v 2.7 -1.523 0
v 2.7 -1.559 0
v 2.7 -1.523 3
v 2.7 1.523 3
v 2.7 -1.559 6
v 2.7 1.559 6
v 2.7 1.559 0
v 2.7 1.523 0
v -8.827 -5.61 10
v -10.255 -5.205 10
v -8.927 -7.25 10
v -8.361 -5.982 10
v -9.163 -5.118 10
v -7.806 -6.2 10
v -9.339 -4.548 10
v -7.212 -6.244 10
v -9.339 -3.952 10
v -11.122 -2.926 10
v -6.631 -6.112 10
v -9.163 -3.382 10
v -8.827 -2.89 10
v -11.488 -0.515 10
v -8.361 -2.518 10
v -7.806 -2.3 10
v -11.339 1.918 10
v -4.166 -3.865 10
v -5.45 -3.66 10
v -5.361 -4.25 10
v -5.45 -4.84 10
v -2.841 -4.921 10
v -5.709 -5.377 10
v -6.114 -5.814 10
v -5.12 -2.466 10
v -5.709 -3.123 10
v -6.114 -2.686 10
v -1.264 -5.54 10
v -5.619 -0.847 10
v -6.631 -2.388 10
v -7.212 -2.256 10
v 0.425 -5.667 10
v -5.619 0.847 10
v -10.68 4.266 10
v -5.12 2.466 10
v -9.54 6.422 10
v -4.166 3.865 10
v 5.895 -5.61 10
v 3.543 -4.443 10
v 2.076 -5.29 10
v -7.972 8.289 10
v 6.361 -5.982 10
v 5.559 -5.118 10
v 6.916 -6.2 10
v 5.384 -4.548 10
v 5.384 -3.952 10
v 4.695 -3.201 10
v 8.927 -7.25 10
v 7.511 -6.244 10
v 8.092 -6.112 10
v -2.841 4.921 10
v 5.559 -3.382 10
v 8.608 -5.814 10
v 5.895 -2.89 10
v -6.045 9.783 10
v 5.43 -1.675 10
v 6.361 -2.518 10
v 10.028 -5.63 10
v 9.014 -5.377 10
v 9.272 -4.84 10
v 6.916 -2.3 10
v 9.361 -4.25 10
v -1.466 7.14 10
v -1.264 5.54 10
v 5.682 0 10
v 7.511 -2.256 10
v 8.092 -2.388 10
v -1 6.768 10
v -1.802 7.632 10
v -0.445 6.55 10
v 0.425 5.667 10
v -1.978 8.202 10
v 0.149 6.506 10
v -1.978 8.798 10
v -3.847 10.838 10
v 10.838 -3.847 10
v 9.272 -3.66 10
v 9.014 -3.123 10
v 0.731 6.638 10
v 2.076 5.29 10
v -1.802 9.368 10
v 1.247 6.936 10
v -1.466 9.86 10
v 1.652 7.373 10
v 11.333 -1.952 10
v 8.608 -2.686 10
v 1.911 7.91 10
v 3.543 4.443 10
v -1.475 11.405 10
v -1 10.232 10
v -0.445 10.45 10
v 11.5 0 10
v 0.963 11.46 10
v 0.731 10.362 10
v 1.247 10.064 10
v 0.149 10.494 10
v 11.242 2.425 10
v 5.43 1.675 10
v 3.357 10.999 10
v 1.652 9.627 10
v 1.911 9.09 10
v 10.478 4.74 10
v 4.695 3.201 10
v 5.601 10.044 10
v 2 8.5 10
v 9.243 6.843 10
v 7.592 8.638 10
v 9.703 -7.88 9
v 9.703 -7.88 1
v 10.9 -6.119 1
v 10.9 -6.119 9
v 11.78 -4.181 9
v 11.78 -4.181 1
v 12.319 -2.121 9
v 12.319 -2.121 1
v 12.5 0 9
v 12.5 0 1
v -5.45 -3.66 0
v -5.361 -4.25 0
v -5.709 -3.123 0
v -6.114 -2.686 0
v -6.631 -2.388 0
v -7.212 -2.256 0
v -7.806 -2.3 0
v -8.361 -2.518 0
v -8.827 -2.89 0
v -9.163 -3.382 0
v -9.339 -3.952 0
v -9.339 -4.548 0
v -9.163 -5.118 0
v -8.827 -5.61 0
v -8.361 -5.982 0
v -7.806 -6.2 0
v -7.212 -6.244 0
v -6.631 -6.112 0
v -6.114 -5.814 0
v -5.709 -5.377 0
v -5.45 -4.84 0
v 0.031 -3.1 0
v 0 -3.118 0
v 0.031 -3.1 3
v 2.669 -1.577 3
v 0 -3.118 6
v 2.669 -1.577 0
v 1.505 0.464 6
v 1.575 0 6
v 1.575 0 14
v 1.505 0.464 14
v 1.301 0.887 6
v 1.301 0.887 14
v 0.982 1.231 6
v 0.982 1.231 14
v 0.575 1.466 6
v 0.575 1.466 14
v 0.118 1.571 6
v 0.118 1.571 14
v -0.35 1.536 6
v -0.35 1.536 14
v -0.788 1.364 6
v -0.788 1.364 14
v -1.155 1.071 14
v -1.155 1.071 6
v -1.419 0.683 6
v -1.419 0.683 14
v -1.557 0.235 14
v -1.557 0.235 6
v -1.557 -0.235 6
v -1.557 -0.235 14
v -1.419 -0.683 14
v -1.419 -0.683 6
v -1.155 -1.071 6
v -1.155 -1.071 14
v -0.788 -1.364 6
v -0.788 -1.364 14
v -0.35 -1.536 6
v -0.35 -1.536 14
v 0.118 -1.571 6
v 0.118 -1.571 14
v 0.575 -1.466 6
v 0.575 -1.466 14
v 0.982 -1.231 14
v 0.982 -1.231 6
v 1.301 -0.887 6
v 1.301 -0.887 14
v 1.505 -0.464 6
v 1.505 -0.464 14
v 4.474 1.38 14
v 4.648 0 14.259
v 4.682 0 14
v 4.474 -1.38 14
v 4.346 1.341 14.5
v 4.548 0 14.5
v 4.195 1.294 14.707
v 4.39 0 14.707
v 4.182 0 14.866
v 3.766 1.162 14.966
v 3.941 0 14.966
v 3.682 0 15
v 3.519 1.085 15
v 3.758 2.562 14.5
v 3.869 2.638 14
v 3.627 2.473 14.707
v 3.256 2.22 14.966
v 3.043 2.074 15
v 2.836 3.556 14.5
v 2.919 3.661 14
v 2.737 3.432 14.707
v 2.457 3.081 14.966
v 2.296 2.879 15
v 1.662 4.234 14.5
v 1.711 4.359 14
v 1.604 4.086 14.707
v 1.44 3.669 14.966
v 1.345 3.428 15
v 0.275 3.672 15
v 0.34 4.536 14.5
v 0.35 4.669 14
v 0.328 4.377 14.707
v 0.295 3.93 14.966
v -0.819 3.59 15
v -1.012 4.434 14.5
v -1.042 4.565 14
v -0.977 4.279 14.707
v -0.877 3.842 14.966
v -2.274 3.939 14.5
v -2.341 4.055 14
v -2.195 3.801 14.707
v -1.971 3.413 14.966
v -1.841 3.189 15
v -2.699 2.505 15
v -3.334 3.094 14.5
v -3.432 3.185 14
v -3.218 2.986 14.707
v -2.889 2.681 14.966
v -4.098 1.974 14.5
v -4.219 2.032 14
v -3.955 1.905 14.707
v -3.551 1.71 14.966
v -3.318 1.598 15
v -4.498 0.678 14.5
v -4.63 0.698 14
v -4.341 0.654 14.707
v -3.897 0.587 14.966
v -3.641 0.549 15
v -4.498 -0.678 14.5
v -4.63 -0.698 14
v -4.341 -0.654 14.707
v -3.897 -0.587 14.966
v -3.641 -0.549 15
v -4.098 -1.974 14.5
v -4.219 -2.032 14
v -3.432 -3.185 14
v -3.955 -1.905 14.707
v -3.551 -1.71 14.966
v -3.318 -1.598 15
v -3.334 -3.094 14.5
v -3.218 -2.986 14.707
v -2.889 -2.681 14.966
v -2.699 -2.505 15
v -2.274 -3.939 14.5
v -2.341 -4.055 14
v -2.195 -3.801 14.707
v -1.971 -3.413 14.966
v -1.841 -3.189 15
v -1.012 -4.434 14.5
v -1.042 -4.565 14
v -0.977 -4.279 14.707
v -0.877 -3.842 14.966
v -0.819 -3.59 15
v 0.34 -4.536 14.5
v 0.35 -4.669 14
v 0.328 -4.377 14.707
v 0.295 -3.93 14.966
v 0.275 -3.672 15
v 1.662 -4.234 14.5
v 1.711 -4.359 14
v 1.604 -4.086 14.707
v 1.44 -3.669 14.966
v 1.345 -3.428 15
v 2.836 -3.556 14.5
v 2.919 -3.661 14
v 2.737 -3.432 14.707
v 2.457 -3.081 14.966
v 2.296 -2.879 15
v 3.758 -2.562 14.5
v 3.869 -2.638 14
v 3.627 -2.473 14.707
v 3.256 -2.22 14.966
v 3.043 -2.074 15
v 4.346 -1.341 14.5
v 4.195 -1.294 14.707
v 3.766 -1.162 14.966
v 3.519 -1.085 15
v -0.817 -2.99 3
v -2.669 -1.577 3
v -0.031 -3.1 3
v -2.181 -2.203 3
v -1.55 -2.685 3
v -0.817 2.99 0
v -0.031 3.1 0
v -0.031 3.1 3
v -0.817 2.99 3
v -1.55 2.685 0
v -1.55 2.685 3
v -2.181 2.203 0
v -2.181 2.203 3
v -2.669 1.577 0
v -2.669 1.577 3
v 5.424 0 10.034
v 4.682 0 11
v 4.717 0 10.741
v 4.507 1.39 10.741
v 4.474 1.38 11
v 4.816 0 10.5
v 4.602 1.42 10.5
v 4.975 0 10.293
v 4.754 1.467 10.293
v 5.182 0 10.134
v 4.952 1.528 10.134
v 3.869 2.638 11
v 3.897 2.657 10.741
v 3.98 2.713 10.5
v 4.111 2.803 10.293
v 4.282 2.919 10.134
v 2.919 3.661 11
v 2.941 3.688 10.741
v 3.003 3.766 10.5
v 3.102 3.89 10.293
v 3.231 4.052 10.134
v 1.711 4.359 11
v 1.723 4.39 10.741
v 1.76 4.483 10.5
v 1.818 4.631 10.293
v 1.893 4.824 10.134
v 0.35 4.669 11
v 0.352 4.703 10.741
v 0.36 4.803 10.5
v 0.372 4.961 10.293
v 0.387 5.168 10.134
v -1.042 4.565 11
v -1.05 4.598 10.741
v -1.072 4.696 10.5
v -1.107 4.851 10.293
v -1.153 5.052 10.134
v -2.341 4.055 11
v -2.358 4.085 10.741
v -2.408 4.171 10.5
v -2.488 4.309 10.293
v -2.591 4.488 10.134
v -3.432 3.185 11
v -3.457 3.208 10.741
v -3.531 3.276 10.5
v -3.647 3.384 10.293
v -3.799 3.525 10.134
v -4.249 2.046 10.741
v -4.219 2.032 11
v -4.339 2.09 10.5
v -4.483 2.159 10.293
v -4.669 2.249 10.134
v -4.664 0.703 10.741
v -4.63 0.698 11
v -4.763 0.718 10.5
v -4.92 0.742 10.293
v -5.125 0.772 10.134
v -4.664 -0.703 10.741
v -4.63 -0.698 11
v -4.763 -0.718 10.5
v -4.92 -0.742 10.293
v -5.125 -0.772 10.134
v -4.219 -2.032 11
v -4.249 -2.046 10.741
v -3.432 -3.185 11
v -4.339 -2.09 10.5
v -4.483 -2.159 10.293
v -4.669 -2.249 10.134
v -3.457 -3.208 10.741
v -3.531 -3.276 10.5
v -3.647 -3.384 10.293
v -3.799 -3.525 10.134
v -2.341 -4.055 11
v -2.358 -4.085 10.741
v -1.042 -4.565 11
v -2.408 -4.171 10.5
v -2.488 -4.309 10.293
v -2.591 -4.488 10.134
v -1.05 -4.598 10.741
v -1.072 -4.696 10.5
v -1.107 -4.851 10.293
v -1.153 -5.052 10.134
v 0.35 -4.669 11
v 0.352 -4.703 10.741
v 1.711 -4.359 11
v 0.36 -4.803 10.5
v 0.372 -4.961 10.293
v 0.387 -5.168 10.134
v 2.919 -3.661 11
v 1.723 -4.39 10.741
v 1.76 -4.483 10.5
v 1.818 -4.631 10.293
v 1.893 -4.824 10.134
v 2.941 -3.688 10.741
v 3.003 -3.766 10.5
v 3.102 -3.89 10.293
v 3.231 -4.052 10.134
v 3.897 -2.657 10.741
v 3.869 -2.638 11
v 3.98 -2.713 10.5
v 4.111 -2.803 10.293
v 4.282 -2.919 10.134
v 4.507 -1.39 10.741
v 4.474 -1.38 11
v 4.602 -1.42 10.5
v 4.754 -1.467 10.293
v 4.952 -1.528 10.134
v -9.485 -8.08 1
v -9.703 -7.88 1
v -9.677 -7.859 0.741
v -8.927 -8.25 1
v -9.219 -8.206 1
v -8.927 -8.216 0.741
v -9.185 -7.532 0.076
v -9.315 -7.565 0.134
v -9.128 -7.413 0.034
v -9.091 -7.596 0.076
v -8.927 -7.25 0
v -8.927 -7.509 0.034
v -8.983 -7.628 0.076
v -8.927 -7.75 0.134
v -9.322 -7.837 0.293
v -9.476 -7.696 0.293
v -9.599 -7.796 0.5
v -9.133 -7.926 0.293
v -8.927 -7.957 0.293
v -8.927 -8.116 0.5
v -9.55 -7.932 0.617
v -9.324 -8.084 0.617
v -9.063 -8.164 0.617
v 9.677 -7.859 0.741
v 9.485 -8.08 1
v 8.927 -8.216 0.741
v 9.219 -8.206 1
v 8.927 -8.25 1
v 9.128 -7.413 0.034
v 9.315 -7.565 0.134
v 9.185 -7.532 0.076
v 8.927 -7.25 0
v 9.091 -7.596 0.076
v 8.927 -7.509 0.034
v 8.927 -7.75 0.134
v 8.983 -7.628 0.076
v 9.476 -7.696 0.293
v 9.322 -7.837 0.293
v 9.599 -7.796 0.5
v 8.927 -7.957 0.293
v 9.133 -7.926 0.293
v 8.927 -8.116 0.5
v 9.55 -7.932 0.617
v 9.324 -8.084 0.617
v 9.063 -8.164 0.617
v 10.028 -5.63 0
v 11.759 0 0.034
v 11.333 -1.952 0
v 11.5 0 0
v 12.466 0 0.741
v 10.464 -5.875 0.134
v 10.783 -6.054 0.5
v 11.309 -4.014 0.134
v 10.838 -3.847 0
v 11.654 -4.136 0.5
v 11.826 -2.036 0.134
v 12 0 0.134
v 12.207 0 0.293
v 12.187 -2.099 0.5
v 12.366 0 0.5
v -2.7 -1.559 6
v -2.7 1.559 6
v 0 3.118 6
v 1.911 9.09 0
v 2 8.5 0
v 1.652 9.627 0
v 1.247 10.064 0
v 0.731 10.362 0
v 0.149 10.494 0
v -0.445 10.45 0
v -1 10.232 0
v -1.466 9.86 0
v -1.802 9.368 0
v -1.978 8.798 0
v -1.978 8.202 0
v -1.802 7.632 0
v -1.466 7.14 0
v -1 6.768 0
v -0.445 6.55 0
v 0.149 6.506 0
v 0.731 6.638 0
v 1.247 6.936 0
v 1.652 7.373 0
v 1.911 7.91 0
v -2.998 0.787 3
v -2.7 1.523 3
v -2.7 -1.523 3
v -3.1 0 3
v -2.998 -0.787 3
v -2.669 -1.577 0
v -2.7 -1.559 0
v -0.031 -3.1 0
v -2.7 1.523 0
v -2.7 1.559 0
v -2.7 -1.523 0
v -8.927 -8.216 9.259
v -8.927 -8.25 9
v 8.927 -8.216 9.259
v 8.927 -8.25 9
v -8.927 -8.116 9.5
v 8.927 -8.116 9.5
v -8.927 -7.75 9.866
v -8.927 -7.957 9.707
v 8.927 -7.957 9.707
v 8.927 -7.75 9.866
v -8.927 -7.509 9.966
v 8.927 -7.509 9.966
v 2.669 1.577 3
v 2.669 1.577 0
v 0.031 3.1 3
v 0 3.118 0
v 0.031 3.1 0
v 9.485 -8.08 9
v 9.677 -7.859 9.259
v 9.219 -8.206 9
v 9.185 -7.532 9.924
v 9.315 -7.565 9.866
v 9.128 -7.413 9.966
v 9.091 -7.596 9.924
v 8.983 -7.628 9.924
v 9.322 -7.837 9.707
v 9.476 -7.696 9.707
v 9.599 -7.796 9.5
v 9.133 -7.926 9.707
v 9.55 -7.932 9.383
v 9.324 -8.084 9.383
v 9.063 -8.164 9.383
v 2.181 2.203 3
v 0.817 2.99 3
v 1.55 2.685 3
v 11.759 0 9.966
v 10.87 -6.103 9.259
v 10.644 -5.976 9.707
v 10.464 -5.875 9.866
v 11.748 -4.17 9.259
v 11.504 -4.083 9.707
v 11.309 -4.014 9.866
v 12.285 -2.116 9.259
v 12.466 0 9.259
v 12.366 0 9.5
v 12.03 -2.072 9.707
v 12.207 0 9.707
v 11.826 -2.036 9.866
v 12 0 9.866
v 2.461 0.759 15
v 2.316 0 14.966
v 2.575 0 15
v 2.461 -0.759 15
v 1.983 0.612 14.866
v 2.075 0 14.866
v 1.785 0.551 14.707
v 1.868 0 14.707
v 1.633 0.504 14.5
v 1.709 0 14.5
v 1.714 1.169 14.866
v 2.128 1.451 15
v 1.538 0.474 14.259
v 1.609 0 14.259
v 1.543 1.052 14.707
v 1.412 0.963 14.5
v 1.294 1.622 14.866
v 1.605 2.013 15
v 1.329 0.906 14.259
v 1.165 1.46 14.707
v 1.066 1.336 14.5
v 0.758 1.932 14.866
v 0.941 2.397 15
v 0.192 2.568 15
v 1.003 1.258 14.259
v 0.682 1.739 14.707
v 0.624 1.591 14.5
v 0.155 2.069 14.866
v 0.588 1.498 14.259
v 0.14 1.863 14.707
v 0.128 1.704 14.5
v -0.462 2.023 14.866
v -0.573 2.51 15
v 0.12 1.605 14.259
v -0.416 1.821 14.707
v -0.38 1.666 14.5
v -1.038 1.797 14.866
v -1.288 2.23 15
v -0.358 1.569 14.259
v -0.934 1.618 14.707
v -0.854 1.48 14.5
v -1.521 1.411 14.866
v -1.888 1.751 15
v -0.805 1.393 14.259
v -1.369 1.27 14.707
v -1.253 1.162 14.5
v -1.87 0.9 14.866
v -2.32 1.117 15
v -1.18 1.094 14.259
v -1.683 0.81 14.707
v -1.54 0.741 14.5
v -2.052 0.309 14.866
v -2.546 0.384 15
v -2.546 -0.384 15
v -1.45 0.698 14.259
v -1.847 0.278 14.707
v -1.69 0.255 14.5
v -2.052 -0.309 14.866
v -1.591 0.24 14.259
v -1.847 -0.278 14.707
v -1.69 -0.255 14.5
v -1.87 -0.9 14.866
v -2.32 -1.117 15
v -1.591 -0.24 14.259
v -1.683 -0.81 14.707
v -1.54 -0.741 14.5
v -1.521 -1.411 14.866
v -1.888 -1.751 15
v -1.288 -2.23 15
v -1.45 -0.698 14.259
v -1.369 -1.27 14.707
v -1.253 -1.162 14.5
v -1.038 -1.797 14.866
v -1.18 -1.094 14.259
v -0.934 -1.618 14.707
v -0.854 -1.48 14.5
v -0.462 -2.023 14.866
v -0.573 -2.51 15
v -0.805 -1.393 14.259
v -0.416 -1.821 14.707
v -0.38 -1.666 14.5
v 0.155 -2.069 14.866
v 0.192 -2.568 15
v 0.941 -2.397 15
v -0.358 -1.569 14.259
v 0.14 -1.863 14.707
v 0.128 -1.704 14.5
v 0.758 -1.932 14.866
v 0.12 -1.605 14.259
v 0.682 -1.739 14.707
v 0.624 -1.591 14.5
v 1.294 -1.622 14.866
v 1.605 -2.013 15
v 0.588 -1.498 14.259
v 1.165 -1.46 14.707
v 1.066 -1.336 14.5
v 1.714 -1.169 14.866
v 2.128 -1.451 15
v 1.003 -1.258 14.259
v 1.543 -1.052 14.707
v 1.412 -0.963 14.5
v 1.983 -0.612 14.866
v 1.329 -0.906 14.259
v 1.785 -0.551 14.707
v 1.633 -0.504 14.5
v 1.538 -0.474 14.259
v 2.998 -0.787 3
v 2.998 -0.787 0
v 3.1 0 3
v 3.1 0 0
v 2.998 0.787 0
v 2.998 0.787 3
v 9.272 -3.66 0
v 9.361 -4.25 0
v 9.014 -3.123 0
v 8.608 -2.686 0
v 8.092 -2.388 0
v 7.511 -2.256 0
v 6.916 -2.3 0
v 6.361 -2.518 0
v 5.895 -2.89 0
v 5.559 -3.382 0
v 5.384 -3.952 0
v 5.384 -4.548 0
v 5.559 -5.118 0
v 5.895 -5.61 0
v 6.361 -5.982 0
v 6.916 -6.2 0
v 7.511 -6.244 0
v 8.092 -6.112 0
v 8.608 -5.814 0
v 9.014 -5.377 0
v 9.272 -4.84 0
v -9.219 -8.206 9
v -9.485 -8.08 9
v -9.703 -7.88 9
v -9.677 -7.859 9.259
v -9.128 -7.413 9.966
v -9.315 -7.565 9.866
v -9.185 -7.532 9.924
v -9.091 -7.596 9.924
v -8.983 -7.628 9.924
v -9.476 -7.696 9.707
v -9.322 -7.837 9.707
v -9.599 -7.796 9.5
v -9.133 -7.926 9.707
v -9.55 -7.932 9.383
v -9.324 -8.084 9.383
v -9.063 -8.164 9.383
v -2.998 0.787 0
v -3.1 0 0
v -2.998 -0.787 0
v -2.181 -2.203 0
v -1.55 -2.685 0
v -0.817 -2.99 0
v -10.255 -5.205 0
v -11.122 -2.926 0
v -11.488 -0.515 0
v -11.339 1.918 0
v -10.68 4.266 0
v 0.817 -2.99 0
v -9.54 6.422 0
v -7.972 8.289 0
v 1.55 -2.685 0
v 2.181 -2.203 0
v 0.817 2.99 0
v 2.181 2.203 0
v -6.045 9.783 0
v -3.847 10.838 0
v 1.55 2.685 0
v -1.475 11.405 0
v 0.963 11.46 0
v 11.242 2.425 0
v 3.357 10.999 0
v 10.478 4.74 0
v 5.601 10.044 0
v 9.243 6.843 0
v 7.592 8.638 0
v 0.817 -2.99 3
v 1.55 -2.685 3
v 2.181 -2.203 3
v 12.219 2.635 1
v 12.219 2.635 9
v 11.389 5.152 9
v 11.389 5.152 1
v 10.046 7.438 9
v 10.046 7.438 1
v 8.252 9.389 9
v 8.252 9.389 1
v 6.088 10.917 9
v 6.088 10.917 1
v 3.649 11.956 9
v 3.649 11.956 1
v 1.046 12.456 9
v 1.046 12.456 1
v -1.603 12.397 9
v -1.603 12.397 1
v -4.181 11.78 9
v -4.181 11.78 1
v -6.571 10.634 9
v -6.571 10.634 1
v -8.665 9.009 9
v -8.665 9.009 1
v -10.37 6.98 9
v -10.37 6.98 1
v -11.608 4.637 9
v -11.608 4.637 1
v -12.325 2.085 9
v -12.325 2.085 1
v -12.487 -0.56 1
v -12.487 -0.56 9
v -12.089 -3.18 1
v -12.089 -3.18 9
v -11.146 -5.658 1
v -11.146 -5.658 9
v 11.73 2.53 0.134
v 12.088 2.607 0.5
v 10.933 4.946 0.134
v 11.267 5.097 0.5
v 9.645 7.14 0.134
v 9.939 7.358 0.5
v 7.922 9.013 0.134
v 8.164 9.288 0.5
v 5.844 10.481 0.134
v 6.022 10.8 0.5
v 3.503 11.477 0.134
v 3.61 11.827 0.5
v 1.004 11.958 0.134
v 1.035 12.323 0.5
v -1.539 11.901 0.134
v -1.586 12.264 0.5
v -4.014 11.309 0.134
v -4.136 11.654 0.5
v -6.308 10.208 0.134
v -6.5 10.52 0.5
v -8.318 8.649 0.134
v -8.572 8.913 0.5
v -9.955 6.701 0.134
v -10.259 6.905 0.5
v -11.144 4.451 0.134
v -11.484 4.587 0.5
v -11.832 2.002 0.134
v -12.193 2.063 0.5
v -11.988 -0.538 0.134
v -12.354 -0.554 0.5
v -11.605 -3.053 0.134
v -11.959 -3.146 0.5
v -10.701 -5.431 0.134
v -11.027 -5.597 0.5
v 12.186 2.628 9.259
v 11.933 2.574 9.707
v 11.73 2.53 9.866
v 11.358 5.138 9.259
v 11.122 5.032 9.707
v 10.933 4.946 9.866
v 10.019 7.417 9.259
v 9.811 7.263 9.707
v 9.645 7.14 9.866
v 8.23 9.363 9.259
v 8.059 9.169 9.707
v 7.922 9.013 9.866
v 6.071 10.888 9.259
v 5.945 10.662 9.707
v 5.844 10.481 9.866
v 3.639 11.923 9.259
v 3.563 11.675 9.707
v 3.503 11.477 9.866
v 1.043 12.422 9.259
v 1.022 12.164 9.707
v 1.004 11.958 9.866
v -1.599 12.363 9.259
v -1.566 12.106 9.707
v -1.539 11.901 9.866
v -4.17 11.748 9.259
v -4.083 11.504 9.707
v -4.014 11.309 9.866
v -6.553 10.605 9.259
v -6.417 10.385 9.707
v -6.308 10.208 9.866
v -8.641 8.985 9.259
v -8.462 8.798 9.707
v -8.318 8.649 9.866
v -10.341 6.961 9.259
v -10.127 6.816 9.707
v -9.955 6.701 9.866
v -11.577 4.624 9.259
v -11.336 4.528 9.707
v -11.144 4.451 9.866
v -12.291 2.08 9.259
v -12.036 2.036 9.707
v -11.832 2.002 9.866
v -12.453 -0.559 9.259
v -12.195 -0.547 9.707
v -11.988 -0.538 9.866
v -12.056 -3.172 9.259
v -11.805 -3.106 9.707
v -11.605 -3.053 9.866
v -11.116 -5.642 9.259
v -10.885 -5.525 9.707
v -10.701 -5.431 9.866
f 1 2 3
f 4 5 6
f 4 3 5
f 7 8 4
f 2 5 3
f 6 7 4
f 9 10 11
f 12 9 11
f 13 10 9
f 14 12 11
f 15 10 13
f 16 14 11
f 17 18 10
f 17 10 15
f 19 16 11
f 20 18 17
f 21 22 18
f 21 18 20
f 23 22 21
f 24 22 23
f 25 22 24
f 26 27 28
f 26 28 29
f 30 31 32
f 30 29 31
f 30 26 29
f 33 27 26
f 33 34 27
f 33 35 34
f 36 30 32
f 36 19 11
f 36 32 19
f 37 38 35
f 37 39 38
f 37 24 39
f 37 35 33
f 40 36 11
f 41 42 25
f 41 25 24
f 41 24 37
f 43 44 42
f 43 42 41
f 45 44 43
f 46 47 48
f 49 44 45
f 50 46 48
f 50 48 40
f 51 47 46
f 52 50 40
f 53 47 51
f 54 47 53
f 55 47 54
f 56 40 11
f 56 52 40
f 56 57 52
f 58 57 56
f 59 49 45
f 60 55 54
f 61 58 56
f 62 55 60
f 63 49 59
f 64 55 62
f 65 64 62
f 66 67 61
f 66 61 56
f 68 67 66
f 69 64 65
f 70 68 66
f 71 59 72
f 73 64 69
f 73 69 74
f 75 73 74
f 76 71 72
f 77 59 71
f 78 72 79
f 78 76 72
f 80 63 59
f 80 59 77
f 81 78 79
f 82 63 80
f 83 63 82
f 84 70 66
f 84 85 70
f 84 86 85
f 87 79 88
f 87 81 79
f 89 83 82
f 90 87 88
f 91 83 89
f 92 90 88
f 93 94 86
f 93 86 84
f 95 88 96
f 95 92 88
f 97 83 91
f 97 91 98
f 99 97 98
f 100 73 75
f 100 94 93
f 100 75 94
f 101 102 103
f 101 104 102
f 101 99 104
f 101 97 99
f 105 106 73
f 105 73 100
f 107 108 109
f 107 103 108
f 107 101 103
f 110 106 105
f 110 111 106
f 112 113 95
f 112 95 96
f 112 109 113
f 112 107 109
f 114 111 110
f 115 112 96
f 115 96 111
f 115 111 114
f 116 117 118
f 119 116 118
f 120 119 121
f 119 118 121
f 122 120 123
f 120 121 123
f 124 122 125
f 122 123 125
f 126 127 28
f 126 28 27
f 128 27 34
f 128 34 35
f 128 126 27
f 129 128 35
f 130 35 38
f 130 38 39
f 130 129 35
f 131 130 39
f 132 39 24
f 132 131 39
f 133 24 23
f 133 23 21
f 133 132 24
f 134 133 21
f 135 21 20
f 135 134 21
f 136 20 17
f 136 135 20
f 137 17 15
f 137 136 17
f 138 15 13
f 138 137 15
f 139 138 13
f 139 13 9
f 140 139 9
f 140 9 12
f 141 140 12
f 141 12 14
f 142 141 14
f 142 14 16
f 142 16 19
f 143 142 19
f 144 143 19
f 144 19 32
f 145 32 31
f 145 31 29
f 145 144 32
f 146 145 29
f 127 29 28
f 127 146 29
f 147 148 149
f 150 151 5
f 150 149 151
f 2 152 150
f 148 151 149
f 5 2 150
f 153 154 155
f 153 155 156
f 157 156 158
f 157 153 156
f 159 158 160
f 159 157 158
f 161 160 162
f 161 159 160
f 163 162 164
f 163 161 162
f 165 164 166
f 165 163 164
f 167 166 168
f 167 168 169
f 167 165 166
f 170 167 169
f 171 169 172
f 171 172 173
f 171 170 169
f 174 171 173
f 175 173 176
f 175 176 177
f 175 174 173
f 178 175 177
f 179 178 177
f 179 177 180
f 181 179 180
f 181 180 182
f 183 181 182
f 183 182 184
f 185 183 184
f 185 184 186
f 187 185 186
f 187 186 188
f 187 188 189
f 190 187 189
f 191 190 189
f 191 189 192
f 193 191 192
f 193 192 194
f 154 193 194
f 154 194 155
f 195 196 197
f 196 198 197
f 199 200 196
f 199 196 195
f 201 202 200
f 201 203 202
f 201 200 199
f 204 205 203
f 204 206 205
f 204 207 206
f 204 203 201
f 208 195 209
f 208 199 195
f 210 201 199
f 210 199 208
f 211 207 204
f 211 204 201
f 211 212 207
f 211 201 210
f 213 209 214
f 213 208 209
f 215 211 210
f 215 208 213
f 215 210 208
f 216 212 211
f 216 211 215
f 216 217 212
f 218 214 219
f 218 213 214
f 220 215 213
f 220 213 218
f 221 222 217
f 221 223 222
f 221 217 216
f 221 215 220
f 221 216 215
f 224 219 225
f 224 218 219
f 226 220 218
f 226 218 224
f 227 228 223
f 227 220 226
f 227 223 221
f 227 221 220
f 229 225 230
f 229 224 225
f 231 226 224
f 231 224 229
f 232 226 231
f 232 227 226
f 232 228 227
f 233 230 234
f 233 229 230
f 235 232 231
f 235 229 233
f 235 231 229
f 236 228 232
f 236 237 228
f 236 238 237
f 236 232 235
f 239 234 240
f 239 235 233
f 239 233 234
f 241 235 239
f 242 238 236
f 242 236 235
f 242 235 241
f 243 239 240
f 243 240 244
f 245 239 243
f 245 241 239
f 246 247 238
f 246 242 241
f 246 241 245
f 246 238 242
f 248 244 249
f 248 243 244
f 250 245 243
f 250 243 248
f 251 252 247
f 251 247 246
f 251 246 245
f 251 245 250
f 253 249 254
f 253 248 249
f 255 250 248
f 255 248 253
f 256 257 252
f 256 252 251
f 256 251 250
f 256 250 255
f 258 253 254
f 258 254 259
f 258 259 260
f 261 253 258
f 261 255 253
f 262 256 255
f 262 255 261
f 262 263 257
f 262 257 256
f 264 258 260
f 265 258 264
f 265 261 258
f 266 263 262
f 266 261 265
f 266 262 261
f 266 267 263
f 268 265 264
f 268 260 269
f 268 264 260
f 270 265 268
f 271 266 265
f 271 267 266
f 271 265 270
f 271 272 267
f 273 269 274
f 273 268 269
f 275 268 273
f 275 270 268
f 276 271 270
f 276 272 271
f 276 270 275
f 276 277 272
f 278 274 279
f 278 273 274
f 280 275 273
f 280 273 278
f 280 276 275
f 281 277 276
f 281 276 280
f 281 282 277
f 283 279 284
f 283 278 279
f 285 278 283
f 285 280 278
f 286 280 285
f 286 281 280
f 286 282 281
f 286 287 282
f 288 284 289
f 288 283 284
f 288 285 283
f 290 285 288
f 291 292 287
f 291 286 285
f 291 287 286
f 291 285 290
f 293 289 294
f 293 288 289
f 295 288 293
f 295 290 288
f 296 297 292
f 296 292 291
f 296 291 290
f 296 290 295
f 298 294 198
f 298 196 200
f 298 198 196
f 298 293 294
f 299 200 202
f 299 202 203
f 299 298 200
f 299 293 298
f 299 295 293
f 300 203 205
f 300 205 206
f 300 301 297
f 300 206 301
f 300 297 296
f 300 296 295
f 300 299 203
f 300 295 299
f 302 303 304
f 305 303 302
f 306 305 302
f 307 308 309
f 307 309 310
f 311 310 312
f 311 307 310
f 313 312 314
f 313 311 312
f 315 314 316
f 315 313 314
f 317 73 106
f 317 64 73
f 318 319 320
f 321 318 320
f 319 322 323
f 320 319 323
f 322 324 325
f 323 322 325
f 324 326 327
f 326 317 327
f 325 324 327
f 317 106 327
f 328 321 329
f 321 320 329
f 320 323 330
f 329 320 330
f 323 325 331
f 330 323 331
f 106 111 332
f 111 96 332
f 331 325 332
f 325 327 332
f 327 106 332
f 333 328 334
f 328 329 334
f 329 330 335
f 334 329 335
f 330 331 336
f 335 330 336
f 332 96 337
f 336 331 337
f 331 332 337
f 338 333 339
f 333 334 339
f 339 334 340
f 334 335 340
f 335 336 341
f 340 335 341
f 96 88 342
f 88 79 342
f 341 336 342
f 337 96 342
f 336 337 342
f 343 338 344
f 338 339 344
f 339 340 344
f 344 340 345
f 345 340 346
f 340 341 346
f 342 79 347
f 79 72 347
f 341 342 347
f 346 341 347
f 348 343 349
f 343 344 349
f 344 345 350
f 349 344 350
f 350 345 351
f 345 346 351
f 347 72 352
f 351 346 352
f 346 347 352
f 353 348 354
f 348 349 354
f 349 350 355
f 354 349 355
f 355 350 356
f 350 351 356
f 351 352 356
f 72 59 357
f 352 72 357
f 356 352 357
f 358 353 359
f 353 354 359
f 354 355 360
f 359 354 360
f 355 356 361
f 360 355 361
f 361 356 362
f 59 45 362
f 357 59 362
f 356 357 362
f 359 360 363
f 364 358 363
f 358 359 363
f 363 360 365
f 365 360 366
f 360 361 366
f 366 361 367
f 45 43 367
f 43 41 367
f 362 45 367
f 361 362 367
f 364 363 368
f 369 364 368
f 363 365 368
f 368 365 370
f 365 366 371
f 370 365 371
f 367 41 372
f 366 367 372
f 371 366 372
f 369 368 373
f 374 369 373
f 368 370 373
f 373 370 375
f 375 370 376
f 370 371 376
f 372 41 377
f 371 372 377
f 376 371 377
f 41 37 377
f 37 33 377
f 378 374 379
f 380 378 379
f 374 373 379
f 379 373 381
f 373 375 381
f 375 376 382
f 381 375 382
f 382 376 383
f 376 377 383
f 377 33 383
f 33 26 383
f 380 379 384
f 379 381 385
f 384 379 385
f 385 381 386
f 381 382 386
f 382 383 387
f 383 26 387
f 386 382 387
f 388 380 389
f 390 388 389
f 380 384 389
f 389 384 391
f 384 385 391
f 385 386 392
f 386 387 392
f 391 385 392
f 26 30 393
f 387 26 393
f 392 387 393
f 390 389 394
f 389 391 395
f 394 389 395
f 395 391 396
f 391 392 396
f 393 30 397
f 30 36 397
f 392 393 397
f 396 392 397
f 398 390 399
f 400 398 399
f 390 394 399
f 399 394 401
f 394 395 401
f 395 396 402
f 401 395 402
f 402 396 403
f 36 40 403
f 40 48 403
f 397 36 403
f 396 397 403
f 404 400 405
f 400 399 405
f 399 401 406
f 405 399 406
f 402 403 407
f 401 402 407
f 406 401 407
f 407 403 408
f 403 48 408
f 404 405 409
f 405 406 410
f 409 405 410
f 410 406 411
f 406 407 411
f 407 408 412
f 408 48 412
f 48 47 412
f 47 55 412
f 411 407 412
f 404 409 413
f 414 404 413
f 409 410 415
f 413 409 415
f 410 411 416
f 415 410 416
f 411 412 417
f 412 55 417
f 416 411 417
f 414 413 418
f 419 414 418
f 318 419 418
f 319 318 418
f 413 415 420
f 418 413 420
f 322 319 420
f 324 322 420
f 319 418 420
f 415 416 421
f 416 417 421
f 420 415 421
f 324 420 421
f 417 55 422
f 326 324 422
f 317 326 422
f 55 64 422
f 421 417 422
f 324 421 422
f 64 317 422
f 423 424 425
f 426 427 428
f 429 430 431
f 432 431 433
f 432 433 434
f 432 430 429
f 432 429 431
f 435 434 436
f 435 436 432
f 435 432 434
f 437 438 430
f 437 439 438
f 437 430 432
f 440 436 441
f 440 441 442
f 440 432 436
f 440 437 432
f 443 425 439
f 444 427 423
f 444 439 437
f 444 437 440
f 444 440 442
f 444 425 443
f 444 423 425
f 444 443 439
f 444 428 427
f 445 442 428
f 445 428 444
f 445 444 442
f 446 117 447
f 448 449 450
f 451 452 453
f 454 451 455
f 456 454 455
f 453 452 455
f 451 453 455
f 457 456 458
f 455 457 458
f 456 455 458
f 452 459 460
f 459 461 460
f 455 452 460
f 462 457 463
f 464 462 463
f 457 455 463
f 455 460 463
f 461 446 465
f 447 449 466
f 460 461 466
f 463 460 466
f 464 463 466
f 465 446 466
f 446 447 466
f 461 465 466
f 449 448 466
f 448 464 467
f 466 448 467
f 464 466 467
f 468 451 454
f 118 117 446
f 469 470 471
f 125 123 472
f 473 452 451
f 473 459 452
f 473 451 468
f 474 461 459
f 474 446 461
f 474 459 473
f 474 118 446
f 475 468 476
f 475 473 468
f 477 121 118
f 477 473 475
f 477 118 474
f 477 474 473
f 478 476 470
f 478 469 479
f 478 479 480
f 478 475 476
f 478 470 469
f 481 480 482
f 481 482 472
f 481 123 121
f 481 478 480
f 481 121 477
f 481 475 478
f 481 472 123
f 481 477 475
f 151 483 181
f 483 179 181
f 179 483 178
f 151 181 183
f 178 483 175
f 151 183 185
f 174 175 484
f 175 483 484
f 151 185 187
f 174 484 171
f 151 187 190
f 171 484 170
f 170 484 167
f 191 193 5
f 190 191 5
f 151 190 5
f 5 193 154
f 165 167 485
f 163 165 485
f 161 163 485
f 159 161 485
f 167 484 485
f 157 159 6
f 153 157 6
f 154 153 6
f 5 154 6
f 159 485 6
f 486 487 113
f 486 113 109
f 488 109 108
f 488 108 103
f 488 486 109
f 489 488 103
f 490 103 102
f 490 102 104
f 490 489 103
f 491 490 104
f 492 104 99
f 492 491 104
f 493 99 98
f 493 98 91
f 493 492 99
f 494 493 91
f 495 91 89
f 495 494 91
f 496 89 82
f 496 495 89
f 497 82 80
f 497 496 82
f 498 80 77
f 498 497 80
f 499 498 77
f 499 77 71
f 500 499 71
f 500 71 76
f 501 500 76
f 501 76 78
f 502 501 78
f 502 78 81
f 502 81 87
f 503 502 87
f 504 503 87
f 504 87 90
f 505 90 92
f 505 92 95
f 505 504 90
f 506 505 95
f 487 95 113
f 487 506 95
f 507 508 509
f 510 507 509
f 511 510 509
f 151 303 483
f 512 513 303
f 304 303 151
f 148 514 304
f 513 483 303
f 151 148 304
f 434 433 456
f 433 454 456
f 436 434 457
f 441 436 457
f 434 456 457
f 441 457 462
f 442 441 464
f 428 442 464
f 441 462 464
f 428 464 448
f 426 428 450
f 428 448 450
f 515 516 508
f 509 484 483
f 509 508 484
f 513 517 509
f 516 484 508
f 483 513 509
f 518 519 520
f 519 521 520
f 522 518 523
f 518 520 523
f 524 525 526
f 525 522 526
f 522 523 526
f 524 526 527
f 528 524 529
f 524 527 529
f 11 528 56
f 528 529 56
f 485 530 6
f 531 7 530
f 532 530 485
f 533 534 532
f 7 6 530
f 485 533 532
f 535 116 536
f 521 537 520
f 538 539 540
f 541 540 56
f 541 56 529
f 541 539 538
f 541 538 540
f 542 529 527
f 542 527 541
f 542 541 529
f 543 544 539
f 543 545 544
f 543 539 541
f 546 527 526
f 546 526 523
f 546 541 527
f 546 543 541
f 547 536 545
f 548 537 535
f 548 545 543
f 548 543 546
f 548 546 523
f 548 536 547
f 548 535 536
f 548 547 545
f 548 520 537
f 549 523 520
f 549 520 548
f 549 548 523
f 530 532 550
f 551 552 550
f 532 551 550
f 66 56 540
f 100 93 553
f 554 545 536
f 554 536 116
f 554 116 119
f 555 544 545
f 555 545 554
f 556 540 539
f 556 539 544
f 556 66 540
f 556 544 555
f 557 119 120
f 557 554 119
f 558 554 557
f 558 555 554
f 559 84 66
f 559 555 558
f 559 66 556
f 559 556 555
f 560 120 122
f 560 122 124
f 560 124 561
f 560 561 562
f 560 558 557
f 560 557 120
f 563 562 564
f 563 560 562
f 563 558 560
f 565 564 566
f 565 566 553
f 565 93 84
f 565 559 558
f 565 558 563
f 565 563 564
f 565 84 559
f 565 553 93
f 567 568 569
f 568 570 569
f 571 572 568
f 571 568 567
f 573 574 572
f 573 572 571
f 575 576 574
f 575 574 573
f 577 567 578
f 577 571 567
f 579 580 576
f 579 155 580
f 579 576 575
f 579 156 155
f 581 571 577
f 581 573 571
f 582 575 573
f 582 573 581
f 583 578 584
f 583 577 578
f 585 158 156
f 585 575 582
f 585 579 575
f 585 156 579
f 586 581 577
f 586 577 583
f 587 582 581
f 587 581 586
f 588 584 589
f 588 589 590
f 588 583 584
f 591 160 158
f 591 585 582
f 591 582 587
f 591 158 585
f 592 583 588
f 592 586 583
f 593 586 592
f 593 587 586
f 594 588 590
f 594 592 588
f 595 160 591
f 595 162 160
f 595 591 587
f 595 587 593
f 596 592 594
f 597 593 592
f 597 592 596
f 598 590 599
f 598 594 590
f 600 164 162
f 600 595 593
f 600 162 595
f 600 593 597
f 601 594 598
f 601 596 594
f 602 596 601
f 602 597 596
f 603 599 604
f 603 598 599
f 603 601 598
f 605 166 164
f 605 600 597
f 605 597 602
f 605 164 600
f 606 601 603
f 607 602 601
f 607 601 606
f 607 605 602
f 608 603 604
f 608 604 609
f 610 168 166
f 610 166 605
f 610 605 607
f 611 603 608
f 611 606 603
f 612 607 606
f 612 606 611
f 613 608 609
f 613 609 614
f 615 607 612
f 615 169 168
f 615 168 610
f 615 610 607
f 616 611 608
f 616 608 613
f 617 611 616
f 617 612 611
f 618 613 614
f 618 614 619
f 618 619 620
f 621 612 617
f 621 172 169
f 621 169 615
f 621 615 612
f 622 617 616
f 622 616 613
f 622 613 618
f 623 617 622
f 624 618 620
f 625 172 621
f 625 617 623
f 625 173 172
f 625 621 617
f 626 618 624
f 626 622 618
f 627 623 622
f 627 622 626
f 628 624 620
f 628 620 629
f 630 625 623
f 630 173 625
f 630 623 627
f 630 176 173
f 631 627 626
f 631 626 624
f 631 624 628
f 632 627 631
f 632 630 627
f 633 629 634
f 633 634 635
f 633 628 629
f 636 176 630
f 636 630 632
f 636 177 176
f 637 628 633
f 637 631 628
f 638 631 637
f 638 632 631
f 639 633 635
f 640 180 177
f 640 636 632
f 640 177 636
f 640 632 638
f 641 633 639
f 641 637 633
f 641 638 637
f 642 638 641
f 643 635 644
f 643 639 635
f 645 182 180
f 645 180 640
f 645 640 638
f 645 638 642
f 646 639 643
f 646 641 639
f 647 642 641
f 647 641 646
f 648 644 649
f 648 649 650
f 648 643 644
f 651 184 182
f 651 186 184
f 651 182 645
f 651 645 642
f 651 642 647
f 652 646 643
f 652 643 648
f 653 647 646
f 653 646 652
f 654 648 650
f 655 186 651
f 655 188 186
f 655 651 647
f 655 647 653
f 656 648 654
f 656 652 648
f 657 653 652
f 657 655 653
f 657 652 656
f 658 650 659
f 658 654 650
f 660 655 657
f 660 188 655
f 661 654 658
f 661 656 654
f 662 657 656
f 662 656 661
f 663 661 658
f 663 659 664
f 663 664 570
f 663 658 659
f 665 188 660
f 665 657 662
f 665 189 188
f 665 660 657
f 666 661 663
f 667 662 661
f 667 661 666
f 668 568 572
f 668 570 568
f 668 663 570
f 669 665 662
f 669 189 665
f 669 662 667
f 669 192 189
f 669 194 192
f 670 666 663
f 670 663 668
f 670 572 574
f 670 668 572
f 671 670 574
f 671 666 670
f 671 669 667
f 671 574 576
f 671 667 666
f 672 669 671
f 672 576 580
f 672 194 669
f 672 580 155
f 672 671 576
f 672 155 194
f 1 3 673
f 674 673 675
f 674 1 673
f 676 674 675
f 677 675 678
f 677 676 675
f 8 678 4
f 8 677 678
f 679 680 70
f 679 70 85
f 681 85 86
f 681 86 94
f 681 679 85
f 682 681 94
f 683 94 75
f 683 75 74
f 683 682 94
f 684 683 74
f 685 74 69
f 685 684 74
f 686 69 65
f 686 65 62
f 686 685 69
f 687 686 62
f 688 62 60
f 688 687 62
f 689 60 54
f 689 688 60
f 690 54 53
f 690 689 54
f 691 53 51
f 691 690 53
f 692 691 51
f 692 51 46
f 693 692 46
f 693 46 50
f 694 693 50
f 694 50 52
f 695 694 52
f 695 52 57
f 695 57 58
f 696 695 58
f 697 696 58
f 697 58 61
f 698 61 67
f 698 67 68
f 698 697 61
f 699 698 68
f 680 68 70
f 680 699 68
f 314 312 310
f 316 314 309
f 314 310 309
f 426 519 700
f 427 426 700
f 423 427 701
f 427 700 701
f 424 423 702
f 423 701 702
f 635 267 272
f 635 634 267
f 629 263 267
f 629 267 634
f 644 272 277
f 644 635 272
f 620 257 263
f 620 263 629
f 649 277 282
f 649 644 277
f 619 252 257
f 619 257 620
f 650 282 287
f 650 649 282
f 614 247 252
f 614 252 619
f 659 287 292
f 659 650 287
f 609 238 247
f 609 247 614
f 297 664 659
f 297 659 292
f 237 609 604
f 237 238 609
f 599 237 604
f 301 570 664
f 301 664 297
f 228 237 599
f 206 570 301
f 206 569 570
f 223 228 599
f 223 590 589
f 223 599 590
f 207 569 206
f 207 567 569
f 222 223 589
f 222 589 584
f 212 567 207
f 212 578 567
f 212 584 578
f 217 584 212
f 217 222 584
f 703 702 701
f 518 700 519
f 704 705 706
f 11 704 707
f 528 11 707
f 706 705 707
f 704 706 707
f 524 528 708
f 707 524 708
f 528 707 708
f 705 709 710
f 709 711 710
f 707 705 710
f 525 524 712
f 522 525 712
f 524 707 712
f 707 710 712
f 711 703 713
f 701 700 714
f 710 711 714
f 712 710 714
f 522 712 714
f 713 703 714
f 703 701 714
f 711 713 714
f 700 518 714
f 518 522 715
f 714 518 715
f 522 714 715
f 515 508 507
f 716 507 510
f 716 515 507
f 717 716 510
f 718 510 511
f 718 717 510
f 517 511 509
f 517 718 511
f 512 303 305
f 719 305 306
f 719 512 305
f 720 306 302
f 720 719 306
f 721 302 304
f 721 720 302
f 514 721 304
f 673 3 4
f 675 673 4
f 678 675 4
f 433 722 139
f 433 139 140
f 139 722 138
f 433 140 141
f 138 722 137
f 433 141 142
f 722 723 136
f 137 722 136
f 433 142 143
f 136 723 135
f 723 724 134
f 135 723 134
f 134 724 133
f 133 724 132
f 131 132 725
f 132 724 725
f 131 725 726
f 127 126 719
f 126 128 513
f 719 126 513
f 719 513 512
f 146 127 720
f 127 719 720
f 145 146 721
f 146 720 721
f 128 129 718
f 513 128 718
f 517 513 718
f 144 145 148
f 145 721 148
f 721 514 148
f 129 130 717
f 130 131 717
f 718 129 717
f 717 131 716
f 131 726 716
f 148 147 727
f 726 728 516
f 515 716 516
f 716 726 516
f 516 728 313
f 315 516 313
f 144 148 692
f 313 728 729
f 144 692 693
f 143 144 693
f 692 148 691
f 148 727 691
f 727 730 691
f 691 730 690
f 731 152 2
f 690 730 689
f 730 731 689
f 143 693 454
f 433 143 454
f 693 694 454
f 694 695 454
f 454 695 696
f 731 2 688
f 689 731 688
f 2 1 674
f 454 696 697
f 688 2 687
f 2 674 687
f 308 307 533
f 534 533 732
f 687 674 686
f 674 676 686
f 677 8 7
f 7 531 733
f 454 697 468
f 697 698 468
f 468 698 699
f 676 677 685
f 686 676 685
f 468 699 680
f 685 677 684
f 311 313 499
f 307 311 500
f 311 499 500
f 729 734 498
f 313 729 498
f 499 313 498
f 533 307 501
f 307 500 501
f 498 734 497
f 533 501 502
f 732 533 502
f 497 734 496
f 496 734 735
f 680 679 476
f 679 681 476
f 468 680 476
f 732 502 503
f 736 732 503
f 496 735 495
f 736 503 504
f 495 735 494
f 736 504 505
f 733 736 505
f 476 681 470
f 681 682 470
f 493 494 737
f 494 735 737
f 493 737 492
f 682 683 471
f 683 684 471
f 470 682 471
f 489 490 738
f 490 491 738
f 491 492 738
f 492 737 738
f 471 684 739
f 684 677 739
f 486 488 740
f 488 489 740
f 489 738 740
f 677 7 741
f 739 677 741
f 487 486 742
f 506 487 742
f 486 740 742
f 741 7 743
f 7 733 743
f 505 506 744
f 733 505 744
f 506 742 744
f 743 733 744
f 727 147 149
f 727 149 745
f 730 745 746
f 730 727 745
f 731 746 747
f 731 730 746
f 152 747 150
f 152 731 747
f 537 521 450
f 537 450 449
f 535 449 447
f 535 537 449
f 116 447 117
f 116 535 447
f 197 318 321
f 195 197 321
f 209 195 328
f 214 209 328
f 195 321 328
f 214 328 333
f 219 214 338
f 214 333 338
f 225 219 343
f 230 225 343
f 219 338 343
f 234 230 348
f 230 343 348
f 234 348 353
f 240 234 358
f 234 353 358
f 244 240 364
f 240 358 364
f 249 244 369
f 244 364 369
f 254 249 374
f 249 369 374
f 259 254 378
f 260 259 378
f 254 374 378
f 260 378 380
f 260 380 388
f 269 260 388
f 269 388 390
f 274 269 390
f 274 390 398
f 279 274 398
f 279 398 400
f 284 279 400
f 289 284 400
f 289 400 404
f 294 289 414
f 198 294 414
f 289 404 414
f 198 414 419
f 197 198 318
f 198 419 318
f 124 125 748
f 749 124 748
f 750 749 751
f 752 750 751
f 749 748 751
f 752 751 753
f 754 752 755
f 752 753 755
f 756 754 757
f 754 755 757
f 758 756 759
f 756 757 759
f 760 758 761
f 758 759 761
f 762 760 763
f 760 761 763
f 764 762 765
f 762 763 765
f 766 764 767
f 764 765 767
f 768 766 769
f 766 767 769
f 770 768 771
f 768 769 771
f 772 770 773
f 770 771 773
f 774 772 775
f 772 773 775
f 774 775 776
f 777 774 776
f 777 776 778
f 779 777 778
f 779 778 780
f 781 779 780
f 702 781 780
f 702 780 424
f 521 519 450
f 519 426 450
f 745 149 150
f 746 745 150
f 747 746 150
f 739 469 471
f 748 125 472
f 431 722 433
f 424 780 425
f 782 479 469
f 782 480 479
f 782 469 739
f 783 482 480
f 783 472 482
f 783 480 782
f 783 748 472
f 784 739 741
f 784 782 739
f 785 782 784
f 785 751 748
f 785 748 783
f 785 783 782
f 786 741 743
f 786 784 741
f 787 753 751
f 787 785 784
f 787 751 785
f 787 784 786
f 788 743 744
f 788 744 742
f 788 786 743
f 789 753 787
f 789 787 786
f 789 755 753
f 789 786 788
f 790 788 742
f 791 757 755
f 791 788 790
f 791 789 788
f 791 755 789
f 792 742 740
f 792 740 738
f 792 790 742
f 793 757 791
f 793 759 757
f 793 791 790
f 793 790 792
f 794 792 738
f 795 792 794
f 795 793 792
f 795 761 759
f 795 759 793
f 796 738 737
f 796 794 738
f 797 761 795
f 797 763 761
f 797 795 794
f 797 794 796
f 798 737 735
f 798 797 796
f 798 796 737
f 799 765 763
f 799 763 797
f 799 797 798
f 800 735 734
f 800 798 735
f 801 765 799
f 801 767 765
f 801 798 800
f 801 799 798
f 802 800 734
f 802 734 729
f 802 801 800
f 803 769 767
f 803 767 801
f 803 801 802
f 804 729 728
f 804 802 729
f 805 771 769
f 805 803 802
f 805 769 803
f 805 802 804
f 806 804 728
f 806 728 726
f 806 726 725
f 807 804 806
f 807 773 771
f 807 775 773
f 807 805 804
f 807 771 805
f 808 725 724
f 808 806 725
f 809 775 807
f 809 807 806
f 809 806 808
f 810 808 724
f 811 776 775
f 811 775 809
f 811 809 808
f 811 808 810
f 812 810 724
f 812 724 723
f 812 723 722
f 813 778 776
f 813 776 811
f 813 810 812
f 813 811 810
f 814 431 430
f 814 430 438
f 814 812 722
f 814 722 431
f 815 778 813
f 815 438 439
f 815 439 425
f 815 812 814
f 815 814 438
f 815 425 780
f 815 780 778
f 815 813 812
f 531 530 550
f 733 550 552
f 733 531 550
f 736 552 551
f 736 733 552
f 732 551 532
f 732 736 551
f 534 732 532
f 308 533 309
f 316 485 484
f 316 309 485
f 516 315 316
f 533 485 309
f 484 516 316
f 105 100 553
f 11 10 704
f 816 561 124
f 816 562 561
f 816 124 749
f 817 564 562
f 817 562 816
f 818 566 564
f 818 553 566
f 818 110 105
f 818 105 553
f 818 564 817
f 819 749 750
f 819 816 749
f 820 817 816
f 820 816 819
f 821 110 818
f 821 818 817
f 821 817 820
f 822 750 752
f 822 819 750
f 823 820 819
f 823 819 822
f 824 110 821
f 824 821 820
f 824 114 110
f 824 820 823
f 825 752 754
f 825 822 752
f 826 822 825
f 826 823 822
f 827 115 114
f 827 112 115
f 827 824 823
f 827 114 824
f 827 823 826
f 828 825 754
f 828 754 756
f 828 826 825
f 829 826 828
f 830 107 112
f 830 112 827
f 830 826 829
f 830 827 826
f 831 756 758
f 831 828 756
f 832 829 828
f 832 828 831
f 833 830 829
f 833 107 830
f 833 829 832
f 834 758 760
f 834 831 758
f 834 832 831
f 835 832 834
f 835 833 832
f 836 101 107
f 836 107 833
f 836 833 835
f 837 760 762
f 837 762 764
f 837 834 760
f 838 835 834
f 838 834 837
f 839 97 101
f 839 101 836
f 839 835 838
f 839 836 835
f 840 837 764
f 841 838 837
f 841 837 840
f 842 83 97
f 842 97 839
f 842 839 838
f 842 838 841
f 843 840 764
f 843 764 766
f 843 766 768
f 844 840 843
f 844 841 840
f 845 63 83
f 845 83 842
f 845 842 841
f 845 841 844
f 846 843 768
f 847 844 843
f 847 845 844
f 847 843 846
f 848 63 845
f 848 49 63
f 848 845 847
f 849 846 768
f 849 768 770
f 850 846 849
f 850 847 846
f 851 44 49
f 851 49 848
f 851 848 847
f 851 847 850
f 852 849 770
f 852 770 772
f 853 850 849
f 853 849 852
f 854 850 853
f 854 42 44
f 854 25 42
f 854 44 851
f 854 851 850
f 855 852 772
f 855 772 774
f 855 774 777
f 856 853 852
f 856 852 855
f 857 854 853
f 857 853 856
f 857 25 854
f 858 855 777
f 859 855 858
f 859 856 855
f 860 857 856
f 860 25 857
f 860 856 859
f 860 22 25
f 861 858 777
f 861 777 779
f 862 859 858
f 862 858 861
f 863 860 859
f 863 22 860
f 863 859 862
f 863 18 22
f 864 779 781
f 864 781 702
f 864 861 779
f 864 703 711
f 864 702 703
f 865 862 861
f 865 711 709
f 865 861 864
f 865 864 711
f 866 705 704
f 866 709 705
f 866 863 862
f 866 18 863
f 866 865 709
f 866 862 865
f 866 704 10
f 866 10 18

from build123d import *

# Parameters (mm, degrees)
F0_R        = 2
F0_R_2      = 4.682431568
F1_DEPTH    = 10
F0_R_3      = 3.1
F0_R_4      = 1.575
F2_DEPTH    = 15
F1_FACE_R   = 2
F1_FACE_R_2 = 4.682431568
F3_DEPTH    = 3
F5_DEPTH    = 6
F6_R        = 1


with BuildPart() as f1:
    # F0 (on Top) → F1 (new body)
    with BuildSketch(Plane.XY):
        with BuildLine():
            ThreePointArc((9.3908199855, -8.25), (11.6969066385, -4.4082167699), (12.5, 0))
            ThreePointArc((12.5, 0), (-4.4082167699, 11.6969066385), (-9.3908199855, -8.25))
            Line((-9.3908199855, -8.25), (9.3908199855, -8.25))
        make_face()
        with Locations((-7.3612159322, -4.25)):
            Circle(F0_R, mode=Mode.SUBTRACT)
        with Locations((7.3612159322, -4.25)):
            Circle(F0_R, mode=Mode.SUBTRACT)
        Circle(F0_R_2, mode=Mode.SUBTRACT)
        with Locations((0, 8.5)):
            Circle(F0_R, mode=Mode.SUBTRACT)
    extrude(amount=F1_DEPTH)

    # F0 (on Top) → F2 (join)
    with BuildSketch(Plane.XY):
        Circle(F0_R_2)
        Circle(F0_R_3, mode=Mode.SUBTRACT)
        Circle(F0_R_3)
        Circle(F0_R_4, mode=Mode.SUBTRACT)
    extrude(amount=F2_DEPTH)

    # F1_face (on face) + F0 (on Top) → F3 (cut)
    with BuildSketch(Plane(origin=(0, 1.6783251384, 10), x_dir=(1, 0, 0), z_dir=(0, 0, 1))):
        with BuildLine():
            ThreePointArc((9.3908199855, -9.9283251384), (0, 10.8216748616), (-9.3908199855, -9.9283251384))
            Line((-9.3908199855, -9.9283251384), (9.3908199855, -9.9283251384))
        make_face()
        with Locations((-7.3612159322, -5.9283251384)):
            Circle(F1_FACE_R, mode=Mode.SUBTRACT)
        with Locations((7.3612159322, -5.9283251384)):
            Circle(F1_FACE_R, mode=Mode.SUBTRACT)
        with Locations((0, -1.6783251384)):
            Circle(F1_FACE_R_2, mode=Mode.SUBTRACT)
        with Locations((0, 6.8216748616)):
            Circle(F1_FACE_R, mode=Mode.SUBTRACT)
    with BuildSketch(Plane.XY):
        Circle(F0_R_3)
        Circle(F0_R_4, mode=Mode.SUBTRACT)
    extrude(amount=F3_DEPTH, mode=Mode.SUBTRACT)

    # F4 (on Top) → F5 (cut)
    with BuildSketch(Plane.XY):
        Polygon((2.7, -1.5588457268), (2.7, 1.5588457268), (0, 3.1176914536), (-2.7, 1.5588457268), (-2.7, -1.5588457268), (0, -3.1176914536), align=None)
    extrude(amount=F5_DEPTH, mode=Mode.SUBTRACT)

    # F6
    f6_edges = [f1.edges().sort_by_distance(p)[0] for p in [
        (-1.575, 0, 15),
        (-4.682432, 0, 15),
        (-4.682432, 0, 10),
        (0, 12.5, 10),
        (0, -8.25, 10),
        (0, 12.5, 0),
        (0, -8.25, 0),
        (9.39082, -8.25, 5),
        (-9.39082, -8.25, 5),
    ]]
    fillet(f6_edges, radius=F6_R)


solid = f1.part
